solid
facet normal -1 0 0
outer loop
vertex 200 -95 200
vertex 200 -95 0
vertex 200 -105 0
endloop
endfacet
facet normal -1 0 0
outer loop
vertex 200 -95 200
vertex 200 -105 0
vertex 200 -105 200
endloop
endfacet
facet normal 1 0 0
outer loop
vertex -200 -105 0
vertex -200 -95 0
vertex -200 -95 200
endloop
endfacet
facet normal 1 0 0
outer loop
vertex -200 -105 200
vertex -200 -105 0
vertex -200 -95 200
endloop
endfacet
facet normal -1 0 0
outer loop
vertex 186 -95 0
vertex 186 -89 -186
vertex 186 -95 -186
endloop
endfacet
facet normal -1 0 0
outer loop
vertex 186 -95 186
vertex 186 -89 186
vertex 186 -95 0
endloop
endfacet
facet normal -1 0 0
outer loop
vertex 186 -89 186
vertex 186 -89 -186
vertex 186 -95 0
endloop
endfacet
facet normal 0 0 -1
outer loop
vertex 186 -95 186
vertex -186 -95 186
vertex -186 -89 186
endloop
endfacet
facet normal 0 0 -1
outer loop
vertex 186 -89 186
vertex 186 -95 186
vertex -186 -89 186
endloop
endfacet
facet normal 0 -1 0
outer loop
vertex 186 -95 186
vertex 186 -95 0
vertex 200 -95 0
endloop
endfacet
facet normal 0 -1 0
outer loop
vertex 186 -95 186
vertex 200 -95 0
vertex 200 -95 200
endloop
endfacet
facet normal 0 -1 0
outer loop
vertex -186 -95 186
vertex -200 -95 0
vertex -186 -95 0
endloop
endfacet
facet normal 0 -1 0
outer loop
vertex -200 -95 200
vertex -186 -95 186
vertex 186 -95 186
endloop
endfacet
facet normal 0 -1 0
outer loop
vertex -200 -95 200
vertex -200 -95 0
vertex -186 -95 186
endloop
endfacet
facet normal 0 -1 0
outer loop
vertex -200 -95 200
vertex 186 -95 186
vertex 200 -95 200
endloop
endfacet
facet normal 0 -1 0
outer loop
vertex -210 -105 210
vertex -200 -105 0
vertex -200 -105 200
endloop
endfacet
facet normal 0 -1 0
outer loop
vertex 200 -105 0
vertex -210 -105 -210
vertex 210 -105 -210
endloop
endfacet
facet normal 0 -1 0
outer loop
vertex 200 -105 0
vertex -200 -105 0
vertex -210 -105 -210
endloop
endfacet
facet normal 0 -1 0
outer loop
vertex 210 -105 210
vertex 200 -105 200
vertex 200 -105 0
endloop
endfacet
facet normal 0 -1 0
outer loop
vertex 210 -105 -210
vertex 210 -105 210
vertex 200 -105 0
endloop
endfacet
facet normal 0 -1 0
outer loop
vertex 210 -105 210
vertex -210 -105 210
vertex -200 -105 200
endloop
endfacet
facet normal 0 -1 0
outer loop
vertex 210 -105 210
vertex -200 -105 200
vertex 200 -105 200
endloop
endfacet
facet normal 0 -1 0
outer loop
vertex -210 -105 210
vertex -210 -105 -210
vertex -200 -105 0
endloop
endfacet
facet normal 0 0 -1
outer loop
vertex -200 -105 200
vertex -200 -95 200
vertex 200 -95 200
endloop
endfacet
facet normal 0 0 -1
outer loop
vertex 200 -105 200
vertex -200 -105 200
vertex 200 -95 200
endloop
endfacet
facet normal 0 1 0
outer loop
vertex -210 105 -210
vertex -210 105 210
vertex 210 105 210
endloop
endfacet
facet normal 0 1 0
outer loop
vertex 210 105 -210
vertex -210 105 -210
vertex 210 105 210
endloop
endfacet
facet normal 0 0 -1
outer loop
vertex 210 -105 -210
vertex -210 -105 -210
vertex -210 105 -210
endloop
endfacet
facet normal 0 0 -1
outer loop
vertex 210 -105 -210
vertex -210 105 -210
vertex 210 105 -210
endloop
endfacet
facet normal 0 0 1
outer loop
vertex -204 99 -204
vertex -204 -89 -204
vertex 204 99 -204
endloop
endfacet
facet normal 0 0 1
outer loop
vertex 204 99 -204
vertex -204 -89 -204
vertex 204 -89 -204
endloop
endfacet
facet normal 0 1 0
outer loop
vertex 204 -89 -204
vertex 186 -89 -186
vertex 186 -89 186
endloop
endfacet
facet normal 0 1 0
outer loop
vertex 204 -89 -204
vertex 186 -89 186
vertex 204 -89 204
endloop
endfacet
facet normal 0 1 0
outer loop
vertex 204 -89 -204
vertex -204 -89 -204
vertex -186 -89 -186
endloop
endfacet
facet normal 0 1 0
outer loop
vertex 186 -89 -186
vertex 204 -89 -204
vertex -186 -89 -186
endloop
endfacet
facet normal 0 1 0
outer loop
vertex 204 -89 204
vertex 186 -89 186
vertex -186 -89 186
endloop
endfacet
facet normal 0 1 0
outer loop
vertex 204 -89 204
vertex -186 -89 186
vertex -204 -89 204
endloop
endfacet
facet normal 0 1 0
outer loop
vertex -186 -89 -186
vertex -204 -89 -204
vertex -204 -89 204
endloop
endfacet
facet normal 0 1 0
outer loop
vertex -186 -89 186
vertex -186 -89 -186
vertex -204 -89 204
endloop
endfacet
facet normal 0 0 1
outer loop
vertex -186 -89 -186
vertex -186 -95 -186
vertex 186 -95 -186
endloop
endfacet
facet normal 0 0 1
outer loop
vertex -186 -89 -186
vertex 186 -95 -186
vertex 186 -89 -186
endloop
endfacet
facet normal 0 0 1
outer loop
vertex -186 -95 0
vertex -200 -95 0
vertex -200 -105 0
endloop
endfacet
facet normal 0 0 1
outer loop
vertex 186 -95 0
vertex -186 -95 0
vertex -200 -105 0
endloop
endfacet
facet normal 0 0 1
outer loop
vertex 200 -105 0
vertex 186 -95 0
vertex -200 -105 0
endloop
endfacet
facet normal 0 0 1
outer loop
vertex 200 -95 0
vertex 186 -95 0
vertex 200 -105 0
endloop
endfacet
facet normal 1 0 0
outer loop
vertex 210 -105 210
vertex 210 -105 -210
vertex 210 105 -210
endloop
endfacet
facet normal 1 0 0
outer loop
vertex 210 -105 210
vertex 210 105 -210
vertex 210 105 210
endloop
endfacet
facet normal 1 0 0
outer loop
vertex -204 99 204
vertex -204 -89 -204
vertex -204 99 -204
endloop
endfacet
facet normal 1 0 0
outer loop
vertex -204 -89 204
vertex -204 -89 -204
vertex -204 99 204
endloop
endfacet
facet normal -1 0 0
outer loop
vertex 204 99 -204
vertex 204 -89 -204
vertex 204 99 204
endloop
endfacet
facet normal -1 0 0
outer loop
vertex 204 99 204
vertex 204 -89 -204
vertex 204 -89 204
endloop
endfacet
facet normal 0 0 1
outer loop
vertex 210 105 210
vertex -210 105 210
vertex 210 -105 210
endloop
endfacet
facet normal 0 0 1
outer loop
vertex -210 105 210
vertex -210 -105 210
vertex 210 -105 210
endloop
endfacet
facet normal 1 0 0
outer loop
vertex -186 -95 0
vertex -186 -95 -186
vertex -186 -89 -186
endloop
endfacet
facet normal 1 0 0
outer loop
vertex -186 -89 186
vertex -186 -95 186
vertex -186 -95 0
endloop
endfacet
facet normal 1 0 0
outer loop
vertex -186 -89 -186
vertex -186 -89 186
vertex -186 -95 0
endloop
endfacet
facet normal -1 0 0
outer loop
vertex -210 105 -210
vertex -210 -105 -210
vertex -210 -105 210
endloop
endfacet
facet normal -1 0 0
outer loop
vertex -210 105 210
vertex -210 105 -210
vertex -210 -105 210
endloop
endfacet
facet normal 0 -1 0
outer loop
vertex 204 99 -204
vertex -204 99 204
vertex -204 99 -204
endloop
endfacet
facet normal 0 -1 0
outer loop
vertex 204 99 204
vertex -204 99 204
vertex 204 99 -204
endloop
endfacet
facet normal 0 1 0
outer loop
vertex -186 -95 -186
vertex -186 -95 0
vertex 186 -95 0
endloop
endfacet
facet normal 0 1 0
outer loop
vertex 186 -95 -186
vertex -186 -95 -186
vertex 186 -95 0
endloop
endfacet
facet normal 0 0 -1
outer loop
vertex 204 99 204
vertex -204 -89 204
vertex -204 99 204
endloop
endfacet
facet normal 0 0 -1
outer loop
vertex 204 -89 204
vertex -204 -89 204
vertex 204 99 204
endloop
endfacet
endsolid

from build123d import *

# Parameters (mm, degrees)
F0_W      = 420
F0_H      = 420
F1_DEPTH  = 105
F2_T      = -6
F3_W      = 6
F3_H      = 408
F4_DEPTH  = 18
F5_W      = 6
F5_H      = 408
F6_DEPTH  = 18
F7_W      = 6
F7_H      = 18
F8_DEPTH  = 372
F9_W      = 6
F9_H      = 18
F10_DEPTH = 372
F11_W     = 408
F11_H     = 408
F11_W_2   = 400
F11_H_2   = 400
F12_DEPTH = 10
F13_W     = 400
F13_H     = 200
F14_DEPTH = 10


with BuildPart() as f1:
    # F0 (on Front) → F1 (new body, symmetric)
    with BuildSketch(Plane.XZ):
        Rectangle(F0_W, F0_H)
    extrude(amount=F1_DEPTH, both=True)

    # F2
    f2_openings = [f1.faces().sort_by_distance(p)[0] for p in [
        (0, -105, 0),
    ]]
    offset(amount=F2_T, openings=f2_openings)

    # F3 (on face) → F4 (join)
    with BuildSketch(Plane.YZ.offset(-204)):
        with Locations((-92, 0)):
            Rectangle(F3_W, F3_H)
    extrude(amount=F4_DEPTH)

    # F5 (on face) → F6 (join)
    with BuildSketch(Plane(origin=(204, 0, 0), x_dir=(0, -1, 0), z_dir=(-1, 0, 0))):
        with Locations((92, 0)):
            Rectangle(F5_W, F5_H)
    extrude(amount=F6_DEPTH)

    # F7 (on face) → F8 (join, through all)
    with BuildSketch(Plane.YZ.offset(-186)):
        with Locations((-92, 195)):
            Rectangle(F7_W, F7_H)
    extrude(amount=F8_DEPTH)

    # F9 (on face) → F10 (join, through all)
    with BuildSketch(Plane.YZ.offset(-186)):
        with Locations((-92, -195)):
            Rectangle(F9_W, F9_H)
    extrude(amount=F10_DEPTH)

    # F11 (on face) → F12 (join)
    with BuildSketch(Plane.XZ.offset(95)):
        Rectangle(F11_W, F11_H)
        Rectangle(F11_W_2, F11_H_2, mode=Mode.SUBTRACT)
    extrude(amount=F12_DEPTH)

    # F13 (on face) → F14 (join)
    with BuildSketch(Plane.XZ.offset(95)):
        with Locations((0, -100)):
            Rectangle(F13_W, F13_H)
    extrude(amount=F14_DEPTH)


solid = f1.part
